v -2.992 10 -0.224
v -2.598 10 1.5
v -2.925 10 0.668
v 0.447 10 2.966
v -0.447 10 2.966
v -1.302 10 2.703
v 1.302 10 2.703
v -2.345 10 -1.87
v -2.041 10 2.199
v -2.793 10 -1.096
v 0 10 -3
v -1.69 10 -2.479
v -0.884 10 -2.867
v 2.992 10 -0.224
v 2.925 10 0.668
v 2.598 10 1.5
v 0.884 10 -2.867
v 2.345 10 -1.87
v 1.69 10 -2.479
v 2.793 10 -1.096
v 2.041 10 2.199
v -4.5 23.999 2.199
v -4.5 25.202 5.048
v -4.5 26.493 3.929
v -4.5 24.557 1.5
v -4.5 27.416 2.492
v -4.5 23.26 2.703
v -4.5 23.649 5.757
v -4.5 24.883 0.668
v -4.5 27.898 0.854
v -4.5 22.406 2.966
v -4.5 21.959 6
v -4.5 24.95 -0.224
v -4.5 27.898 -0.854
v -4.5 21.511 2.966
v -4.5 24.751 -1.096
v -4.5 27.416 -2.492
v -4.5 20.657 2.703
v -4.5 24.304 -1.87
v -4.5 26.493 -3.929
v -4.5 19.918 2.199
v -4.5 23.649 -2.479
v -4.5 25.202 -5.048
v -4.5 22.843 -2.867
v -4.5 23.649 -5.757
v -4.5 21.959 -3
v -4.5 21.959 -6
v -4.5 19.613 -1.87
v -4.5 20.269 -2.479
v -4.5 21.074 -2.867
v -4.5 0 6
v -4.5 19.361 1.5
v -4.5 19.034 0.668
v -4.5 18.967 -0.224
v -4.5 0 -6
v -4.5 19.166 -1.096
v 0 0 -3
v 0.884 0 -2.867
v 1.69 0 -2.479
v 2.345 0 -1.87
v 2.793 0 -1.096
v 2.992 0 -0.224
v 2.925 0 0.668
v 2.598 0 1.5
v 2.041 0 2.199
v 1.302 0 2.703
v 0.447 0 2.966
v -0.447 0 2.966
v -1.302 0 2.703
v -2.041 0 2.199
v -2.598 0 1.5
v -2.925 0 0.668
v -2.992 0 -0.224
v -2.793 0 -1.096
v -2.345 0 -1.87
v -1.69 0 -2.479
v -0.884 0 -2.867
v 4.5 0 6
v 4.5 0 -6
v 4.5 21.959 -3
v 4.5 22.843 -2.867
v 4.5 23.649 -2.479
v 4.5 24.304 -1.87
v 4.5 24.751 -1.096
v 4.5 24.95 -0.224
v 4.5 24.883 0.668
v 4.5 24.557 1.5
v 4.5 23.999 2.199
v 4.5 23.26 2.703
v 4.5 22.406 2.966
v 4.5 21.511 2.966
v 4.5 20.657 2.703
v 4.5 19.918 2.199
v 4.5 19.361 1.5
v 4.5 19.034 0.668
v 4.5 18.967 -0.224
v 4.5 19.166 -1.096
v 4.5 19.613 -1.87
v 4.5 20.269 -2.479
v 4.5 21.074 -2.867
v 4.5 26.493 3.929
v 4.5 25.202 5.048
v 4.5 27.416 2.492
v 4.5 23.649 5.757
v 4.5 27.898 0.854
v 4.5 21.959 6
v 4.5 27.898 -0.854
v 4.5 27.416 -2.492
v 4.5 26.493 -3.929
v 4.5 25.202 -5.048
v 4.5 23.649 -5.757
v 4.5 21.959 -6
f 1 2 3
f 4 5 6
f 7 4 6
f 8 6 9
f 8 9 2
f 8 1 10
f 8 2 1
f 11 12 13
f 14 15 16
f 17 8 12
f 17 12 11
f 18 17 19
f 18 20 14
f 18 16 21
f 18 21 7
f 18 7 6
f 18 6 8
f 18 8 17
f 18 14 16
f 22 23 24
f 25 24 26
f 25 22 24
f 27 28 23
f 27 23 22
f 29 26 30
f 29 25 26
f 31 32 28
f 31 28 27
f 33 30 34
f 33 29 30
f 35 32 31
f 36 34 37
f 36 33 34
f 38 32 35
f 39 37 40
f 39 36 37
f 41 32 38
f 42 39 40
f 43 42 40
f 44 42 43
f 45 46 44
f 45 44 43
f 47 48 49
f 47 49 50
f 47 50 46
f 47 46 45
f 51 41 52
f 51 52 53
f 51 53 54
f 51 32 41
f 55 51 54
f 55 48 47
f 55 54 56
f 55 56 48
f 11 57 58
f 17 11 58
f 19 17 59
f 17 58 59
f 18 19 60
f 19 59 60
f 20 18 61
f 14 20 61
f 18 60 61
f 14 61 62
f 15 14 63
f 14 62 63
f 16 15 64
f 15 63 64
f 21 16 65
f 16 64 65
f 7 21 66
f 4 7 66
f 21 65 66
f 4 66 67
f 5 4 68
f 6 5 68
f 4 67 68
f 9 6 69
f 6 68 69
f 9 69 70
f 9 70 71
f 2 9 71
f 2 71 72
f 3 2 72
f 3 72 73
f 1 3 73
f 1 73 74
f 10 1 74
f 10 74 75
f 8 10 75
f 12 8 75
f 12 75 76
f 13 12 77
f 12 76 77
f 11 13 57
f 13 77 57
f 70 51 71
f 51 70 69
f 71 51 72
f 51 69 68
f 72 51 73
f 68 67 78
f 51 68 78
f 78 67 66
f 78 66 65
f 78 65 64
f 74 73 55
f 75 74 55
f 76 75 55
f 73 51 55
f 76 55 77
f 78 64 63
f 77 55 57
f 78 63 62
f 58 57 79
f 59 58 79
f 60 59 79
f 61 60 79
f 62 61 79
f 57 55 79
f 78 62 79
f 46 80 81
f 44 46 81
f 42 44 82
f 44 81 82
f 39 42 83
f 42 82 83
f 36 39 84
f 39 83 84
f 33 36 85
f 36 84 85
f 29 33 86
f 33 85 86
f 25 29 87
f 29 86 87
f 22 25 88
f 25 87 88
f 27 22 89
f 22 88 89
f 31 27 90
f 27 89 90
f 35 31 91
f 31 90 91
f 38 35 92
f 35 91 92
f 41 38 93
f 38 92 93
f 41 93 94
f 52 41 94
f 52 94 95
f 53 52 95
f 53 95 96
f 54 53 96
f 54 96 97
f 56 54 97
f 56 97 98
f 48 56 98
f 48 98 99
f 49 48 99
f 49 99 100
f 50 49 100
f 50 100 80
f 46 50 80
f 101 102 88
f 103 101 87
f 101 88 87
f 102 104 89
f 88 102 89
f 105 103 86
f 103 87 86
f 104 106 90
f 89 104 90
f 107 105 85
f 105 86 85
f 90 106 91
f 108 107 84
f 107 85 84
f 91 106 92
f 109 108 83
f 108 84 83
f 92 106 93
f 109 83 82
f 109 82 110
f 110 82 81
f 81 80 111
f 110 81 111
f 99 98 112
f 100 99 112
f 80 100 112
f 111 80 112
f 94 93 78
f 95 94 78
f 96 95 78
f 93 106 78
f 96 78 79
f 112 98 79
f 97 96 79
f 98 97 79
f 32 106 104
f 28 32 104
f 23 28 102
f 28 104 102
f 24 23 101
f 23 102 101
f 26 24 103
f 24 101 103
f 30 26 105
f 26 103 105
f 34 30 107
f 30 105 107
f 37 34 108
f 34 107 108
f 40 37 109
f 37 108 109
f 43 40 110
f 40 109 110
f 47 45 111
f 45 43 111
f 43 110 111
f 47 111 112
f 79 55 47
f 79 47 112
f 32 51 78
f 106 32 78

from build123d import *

# Parameters (mm, degrees)
SKETCH_1_W          = 9
SKETCH_1_H          = 12
EXTRUDE_1_DEPTH     = 28
SKETCH_2_OUTSIDE_W  = 20.352
SKETCH_2_OUTSIDE_H  = 36.352
CUT_EXTRUDE_1_DEPTH = 31.01666204
SKETCH_3_R          = 3
CUT_EXTRUDE_2_DEPTH = 10
SKETCH_4_R          = 3
CUT_EXTRUDE_3_DEPTH = 30.978055751


with BuildPart() as part:
    # 草图1 → 凸台-拉伸1 (new body)
    with BuildSketch(Plane(origin=(0, 0, 0), x_dir=(1, 0, 0), z_dir=(0, 1, 0))):
        Rectangle(SKETCH_1_W, SKETCH_1_H)
    extrude(amount=EXTRUDE_1_DEPTH)

    # 草图2 outside → 切除-拉伸1 (cut, through all)
    with BuildSketch(Plane(origin=(4.5, 0, 0), x_dir=(0, 0, -1), z_dir=(1, 0, 0))):
        with Locations((0, 14)):
            Rectangle(SKETCH_2_OUTSIDE_W, SKETCH_2_OUTSIDE_H)
        with BuildLine():
            Line((-6, -3.744960893), (-6, 21.958609168))
            ThreePointArc((-6, 21.958609168), (0, 27.958609168), (6, 21.958609168))
            Line((6, 21.958609168), (6, -3.744960893))
            ThreePointArc((6, -3.744960893), (0, -9.744960893), (-6, -3.744960893))
        make_face(mode=Mode.SUBTRACT)
    extrude(amount=-CUT_EXTRUDE_1_DEPTH, mode=Mode.SUBTRACT)

    # 草图3 → 切除-拉伸2 (cut)
    with BuildSketch(Plane.XZ):
        with Locations(Location((0, 0, 0), (0, 0, 270))):
            Circle(SKETCH_3_R)
    extrude(amount=-CUT_EXTRUDE_2_DEPTH, mode=Mode.SUBTRACT)

    # 草图4 → 切除-拉伸3 (cut, through all)
    with BuildSketch(Plane(origin=(4.5, 0, 0), x_dir=(0, 0, -1), z_dir=(1, 0, 0))):
        with Locations((0, 21.958609168)):
            Circle(SKETCH_4_R)
    extrude(amount=-CUT_EXTRUDE_3_DEPTH, mode=Mode.SUBTRACT)


solid = part.part
